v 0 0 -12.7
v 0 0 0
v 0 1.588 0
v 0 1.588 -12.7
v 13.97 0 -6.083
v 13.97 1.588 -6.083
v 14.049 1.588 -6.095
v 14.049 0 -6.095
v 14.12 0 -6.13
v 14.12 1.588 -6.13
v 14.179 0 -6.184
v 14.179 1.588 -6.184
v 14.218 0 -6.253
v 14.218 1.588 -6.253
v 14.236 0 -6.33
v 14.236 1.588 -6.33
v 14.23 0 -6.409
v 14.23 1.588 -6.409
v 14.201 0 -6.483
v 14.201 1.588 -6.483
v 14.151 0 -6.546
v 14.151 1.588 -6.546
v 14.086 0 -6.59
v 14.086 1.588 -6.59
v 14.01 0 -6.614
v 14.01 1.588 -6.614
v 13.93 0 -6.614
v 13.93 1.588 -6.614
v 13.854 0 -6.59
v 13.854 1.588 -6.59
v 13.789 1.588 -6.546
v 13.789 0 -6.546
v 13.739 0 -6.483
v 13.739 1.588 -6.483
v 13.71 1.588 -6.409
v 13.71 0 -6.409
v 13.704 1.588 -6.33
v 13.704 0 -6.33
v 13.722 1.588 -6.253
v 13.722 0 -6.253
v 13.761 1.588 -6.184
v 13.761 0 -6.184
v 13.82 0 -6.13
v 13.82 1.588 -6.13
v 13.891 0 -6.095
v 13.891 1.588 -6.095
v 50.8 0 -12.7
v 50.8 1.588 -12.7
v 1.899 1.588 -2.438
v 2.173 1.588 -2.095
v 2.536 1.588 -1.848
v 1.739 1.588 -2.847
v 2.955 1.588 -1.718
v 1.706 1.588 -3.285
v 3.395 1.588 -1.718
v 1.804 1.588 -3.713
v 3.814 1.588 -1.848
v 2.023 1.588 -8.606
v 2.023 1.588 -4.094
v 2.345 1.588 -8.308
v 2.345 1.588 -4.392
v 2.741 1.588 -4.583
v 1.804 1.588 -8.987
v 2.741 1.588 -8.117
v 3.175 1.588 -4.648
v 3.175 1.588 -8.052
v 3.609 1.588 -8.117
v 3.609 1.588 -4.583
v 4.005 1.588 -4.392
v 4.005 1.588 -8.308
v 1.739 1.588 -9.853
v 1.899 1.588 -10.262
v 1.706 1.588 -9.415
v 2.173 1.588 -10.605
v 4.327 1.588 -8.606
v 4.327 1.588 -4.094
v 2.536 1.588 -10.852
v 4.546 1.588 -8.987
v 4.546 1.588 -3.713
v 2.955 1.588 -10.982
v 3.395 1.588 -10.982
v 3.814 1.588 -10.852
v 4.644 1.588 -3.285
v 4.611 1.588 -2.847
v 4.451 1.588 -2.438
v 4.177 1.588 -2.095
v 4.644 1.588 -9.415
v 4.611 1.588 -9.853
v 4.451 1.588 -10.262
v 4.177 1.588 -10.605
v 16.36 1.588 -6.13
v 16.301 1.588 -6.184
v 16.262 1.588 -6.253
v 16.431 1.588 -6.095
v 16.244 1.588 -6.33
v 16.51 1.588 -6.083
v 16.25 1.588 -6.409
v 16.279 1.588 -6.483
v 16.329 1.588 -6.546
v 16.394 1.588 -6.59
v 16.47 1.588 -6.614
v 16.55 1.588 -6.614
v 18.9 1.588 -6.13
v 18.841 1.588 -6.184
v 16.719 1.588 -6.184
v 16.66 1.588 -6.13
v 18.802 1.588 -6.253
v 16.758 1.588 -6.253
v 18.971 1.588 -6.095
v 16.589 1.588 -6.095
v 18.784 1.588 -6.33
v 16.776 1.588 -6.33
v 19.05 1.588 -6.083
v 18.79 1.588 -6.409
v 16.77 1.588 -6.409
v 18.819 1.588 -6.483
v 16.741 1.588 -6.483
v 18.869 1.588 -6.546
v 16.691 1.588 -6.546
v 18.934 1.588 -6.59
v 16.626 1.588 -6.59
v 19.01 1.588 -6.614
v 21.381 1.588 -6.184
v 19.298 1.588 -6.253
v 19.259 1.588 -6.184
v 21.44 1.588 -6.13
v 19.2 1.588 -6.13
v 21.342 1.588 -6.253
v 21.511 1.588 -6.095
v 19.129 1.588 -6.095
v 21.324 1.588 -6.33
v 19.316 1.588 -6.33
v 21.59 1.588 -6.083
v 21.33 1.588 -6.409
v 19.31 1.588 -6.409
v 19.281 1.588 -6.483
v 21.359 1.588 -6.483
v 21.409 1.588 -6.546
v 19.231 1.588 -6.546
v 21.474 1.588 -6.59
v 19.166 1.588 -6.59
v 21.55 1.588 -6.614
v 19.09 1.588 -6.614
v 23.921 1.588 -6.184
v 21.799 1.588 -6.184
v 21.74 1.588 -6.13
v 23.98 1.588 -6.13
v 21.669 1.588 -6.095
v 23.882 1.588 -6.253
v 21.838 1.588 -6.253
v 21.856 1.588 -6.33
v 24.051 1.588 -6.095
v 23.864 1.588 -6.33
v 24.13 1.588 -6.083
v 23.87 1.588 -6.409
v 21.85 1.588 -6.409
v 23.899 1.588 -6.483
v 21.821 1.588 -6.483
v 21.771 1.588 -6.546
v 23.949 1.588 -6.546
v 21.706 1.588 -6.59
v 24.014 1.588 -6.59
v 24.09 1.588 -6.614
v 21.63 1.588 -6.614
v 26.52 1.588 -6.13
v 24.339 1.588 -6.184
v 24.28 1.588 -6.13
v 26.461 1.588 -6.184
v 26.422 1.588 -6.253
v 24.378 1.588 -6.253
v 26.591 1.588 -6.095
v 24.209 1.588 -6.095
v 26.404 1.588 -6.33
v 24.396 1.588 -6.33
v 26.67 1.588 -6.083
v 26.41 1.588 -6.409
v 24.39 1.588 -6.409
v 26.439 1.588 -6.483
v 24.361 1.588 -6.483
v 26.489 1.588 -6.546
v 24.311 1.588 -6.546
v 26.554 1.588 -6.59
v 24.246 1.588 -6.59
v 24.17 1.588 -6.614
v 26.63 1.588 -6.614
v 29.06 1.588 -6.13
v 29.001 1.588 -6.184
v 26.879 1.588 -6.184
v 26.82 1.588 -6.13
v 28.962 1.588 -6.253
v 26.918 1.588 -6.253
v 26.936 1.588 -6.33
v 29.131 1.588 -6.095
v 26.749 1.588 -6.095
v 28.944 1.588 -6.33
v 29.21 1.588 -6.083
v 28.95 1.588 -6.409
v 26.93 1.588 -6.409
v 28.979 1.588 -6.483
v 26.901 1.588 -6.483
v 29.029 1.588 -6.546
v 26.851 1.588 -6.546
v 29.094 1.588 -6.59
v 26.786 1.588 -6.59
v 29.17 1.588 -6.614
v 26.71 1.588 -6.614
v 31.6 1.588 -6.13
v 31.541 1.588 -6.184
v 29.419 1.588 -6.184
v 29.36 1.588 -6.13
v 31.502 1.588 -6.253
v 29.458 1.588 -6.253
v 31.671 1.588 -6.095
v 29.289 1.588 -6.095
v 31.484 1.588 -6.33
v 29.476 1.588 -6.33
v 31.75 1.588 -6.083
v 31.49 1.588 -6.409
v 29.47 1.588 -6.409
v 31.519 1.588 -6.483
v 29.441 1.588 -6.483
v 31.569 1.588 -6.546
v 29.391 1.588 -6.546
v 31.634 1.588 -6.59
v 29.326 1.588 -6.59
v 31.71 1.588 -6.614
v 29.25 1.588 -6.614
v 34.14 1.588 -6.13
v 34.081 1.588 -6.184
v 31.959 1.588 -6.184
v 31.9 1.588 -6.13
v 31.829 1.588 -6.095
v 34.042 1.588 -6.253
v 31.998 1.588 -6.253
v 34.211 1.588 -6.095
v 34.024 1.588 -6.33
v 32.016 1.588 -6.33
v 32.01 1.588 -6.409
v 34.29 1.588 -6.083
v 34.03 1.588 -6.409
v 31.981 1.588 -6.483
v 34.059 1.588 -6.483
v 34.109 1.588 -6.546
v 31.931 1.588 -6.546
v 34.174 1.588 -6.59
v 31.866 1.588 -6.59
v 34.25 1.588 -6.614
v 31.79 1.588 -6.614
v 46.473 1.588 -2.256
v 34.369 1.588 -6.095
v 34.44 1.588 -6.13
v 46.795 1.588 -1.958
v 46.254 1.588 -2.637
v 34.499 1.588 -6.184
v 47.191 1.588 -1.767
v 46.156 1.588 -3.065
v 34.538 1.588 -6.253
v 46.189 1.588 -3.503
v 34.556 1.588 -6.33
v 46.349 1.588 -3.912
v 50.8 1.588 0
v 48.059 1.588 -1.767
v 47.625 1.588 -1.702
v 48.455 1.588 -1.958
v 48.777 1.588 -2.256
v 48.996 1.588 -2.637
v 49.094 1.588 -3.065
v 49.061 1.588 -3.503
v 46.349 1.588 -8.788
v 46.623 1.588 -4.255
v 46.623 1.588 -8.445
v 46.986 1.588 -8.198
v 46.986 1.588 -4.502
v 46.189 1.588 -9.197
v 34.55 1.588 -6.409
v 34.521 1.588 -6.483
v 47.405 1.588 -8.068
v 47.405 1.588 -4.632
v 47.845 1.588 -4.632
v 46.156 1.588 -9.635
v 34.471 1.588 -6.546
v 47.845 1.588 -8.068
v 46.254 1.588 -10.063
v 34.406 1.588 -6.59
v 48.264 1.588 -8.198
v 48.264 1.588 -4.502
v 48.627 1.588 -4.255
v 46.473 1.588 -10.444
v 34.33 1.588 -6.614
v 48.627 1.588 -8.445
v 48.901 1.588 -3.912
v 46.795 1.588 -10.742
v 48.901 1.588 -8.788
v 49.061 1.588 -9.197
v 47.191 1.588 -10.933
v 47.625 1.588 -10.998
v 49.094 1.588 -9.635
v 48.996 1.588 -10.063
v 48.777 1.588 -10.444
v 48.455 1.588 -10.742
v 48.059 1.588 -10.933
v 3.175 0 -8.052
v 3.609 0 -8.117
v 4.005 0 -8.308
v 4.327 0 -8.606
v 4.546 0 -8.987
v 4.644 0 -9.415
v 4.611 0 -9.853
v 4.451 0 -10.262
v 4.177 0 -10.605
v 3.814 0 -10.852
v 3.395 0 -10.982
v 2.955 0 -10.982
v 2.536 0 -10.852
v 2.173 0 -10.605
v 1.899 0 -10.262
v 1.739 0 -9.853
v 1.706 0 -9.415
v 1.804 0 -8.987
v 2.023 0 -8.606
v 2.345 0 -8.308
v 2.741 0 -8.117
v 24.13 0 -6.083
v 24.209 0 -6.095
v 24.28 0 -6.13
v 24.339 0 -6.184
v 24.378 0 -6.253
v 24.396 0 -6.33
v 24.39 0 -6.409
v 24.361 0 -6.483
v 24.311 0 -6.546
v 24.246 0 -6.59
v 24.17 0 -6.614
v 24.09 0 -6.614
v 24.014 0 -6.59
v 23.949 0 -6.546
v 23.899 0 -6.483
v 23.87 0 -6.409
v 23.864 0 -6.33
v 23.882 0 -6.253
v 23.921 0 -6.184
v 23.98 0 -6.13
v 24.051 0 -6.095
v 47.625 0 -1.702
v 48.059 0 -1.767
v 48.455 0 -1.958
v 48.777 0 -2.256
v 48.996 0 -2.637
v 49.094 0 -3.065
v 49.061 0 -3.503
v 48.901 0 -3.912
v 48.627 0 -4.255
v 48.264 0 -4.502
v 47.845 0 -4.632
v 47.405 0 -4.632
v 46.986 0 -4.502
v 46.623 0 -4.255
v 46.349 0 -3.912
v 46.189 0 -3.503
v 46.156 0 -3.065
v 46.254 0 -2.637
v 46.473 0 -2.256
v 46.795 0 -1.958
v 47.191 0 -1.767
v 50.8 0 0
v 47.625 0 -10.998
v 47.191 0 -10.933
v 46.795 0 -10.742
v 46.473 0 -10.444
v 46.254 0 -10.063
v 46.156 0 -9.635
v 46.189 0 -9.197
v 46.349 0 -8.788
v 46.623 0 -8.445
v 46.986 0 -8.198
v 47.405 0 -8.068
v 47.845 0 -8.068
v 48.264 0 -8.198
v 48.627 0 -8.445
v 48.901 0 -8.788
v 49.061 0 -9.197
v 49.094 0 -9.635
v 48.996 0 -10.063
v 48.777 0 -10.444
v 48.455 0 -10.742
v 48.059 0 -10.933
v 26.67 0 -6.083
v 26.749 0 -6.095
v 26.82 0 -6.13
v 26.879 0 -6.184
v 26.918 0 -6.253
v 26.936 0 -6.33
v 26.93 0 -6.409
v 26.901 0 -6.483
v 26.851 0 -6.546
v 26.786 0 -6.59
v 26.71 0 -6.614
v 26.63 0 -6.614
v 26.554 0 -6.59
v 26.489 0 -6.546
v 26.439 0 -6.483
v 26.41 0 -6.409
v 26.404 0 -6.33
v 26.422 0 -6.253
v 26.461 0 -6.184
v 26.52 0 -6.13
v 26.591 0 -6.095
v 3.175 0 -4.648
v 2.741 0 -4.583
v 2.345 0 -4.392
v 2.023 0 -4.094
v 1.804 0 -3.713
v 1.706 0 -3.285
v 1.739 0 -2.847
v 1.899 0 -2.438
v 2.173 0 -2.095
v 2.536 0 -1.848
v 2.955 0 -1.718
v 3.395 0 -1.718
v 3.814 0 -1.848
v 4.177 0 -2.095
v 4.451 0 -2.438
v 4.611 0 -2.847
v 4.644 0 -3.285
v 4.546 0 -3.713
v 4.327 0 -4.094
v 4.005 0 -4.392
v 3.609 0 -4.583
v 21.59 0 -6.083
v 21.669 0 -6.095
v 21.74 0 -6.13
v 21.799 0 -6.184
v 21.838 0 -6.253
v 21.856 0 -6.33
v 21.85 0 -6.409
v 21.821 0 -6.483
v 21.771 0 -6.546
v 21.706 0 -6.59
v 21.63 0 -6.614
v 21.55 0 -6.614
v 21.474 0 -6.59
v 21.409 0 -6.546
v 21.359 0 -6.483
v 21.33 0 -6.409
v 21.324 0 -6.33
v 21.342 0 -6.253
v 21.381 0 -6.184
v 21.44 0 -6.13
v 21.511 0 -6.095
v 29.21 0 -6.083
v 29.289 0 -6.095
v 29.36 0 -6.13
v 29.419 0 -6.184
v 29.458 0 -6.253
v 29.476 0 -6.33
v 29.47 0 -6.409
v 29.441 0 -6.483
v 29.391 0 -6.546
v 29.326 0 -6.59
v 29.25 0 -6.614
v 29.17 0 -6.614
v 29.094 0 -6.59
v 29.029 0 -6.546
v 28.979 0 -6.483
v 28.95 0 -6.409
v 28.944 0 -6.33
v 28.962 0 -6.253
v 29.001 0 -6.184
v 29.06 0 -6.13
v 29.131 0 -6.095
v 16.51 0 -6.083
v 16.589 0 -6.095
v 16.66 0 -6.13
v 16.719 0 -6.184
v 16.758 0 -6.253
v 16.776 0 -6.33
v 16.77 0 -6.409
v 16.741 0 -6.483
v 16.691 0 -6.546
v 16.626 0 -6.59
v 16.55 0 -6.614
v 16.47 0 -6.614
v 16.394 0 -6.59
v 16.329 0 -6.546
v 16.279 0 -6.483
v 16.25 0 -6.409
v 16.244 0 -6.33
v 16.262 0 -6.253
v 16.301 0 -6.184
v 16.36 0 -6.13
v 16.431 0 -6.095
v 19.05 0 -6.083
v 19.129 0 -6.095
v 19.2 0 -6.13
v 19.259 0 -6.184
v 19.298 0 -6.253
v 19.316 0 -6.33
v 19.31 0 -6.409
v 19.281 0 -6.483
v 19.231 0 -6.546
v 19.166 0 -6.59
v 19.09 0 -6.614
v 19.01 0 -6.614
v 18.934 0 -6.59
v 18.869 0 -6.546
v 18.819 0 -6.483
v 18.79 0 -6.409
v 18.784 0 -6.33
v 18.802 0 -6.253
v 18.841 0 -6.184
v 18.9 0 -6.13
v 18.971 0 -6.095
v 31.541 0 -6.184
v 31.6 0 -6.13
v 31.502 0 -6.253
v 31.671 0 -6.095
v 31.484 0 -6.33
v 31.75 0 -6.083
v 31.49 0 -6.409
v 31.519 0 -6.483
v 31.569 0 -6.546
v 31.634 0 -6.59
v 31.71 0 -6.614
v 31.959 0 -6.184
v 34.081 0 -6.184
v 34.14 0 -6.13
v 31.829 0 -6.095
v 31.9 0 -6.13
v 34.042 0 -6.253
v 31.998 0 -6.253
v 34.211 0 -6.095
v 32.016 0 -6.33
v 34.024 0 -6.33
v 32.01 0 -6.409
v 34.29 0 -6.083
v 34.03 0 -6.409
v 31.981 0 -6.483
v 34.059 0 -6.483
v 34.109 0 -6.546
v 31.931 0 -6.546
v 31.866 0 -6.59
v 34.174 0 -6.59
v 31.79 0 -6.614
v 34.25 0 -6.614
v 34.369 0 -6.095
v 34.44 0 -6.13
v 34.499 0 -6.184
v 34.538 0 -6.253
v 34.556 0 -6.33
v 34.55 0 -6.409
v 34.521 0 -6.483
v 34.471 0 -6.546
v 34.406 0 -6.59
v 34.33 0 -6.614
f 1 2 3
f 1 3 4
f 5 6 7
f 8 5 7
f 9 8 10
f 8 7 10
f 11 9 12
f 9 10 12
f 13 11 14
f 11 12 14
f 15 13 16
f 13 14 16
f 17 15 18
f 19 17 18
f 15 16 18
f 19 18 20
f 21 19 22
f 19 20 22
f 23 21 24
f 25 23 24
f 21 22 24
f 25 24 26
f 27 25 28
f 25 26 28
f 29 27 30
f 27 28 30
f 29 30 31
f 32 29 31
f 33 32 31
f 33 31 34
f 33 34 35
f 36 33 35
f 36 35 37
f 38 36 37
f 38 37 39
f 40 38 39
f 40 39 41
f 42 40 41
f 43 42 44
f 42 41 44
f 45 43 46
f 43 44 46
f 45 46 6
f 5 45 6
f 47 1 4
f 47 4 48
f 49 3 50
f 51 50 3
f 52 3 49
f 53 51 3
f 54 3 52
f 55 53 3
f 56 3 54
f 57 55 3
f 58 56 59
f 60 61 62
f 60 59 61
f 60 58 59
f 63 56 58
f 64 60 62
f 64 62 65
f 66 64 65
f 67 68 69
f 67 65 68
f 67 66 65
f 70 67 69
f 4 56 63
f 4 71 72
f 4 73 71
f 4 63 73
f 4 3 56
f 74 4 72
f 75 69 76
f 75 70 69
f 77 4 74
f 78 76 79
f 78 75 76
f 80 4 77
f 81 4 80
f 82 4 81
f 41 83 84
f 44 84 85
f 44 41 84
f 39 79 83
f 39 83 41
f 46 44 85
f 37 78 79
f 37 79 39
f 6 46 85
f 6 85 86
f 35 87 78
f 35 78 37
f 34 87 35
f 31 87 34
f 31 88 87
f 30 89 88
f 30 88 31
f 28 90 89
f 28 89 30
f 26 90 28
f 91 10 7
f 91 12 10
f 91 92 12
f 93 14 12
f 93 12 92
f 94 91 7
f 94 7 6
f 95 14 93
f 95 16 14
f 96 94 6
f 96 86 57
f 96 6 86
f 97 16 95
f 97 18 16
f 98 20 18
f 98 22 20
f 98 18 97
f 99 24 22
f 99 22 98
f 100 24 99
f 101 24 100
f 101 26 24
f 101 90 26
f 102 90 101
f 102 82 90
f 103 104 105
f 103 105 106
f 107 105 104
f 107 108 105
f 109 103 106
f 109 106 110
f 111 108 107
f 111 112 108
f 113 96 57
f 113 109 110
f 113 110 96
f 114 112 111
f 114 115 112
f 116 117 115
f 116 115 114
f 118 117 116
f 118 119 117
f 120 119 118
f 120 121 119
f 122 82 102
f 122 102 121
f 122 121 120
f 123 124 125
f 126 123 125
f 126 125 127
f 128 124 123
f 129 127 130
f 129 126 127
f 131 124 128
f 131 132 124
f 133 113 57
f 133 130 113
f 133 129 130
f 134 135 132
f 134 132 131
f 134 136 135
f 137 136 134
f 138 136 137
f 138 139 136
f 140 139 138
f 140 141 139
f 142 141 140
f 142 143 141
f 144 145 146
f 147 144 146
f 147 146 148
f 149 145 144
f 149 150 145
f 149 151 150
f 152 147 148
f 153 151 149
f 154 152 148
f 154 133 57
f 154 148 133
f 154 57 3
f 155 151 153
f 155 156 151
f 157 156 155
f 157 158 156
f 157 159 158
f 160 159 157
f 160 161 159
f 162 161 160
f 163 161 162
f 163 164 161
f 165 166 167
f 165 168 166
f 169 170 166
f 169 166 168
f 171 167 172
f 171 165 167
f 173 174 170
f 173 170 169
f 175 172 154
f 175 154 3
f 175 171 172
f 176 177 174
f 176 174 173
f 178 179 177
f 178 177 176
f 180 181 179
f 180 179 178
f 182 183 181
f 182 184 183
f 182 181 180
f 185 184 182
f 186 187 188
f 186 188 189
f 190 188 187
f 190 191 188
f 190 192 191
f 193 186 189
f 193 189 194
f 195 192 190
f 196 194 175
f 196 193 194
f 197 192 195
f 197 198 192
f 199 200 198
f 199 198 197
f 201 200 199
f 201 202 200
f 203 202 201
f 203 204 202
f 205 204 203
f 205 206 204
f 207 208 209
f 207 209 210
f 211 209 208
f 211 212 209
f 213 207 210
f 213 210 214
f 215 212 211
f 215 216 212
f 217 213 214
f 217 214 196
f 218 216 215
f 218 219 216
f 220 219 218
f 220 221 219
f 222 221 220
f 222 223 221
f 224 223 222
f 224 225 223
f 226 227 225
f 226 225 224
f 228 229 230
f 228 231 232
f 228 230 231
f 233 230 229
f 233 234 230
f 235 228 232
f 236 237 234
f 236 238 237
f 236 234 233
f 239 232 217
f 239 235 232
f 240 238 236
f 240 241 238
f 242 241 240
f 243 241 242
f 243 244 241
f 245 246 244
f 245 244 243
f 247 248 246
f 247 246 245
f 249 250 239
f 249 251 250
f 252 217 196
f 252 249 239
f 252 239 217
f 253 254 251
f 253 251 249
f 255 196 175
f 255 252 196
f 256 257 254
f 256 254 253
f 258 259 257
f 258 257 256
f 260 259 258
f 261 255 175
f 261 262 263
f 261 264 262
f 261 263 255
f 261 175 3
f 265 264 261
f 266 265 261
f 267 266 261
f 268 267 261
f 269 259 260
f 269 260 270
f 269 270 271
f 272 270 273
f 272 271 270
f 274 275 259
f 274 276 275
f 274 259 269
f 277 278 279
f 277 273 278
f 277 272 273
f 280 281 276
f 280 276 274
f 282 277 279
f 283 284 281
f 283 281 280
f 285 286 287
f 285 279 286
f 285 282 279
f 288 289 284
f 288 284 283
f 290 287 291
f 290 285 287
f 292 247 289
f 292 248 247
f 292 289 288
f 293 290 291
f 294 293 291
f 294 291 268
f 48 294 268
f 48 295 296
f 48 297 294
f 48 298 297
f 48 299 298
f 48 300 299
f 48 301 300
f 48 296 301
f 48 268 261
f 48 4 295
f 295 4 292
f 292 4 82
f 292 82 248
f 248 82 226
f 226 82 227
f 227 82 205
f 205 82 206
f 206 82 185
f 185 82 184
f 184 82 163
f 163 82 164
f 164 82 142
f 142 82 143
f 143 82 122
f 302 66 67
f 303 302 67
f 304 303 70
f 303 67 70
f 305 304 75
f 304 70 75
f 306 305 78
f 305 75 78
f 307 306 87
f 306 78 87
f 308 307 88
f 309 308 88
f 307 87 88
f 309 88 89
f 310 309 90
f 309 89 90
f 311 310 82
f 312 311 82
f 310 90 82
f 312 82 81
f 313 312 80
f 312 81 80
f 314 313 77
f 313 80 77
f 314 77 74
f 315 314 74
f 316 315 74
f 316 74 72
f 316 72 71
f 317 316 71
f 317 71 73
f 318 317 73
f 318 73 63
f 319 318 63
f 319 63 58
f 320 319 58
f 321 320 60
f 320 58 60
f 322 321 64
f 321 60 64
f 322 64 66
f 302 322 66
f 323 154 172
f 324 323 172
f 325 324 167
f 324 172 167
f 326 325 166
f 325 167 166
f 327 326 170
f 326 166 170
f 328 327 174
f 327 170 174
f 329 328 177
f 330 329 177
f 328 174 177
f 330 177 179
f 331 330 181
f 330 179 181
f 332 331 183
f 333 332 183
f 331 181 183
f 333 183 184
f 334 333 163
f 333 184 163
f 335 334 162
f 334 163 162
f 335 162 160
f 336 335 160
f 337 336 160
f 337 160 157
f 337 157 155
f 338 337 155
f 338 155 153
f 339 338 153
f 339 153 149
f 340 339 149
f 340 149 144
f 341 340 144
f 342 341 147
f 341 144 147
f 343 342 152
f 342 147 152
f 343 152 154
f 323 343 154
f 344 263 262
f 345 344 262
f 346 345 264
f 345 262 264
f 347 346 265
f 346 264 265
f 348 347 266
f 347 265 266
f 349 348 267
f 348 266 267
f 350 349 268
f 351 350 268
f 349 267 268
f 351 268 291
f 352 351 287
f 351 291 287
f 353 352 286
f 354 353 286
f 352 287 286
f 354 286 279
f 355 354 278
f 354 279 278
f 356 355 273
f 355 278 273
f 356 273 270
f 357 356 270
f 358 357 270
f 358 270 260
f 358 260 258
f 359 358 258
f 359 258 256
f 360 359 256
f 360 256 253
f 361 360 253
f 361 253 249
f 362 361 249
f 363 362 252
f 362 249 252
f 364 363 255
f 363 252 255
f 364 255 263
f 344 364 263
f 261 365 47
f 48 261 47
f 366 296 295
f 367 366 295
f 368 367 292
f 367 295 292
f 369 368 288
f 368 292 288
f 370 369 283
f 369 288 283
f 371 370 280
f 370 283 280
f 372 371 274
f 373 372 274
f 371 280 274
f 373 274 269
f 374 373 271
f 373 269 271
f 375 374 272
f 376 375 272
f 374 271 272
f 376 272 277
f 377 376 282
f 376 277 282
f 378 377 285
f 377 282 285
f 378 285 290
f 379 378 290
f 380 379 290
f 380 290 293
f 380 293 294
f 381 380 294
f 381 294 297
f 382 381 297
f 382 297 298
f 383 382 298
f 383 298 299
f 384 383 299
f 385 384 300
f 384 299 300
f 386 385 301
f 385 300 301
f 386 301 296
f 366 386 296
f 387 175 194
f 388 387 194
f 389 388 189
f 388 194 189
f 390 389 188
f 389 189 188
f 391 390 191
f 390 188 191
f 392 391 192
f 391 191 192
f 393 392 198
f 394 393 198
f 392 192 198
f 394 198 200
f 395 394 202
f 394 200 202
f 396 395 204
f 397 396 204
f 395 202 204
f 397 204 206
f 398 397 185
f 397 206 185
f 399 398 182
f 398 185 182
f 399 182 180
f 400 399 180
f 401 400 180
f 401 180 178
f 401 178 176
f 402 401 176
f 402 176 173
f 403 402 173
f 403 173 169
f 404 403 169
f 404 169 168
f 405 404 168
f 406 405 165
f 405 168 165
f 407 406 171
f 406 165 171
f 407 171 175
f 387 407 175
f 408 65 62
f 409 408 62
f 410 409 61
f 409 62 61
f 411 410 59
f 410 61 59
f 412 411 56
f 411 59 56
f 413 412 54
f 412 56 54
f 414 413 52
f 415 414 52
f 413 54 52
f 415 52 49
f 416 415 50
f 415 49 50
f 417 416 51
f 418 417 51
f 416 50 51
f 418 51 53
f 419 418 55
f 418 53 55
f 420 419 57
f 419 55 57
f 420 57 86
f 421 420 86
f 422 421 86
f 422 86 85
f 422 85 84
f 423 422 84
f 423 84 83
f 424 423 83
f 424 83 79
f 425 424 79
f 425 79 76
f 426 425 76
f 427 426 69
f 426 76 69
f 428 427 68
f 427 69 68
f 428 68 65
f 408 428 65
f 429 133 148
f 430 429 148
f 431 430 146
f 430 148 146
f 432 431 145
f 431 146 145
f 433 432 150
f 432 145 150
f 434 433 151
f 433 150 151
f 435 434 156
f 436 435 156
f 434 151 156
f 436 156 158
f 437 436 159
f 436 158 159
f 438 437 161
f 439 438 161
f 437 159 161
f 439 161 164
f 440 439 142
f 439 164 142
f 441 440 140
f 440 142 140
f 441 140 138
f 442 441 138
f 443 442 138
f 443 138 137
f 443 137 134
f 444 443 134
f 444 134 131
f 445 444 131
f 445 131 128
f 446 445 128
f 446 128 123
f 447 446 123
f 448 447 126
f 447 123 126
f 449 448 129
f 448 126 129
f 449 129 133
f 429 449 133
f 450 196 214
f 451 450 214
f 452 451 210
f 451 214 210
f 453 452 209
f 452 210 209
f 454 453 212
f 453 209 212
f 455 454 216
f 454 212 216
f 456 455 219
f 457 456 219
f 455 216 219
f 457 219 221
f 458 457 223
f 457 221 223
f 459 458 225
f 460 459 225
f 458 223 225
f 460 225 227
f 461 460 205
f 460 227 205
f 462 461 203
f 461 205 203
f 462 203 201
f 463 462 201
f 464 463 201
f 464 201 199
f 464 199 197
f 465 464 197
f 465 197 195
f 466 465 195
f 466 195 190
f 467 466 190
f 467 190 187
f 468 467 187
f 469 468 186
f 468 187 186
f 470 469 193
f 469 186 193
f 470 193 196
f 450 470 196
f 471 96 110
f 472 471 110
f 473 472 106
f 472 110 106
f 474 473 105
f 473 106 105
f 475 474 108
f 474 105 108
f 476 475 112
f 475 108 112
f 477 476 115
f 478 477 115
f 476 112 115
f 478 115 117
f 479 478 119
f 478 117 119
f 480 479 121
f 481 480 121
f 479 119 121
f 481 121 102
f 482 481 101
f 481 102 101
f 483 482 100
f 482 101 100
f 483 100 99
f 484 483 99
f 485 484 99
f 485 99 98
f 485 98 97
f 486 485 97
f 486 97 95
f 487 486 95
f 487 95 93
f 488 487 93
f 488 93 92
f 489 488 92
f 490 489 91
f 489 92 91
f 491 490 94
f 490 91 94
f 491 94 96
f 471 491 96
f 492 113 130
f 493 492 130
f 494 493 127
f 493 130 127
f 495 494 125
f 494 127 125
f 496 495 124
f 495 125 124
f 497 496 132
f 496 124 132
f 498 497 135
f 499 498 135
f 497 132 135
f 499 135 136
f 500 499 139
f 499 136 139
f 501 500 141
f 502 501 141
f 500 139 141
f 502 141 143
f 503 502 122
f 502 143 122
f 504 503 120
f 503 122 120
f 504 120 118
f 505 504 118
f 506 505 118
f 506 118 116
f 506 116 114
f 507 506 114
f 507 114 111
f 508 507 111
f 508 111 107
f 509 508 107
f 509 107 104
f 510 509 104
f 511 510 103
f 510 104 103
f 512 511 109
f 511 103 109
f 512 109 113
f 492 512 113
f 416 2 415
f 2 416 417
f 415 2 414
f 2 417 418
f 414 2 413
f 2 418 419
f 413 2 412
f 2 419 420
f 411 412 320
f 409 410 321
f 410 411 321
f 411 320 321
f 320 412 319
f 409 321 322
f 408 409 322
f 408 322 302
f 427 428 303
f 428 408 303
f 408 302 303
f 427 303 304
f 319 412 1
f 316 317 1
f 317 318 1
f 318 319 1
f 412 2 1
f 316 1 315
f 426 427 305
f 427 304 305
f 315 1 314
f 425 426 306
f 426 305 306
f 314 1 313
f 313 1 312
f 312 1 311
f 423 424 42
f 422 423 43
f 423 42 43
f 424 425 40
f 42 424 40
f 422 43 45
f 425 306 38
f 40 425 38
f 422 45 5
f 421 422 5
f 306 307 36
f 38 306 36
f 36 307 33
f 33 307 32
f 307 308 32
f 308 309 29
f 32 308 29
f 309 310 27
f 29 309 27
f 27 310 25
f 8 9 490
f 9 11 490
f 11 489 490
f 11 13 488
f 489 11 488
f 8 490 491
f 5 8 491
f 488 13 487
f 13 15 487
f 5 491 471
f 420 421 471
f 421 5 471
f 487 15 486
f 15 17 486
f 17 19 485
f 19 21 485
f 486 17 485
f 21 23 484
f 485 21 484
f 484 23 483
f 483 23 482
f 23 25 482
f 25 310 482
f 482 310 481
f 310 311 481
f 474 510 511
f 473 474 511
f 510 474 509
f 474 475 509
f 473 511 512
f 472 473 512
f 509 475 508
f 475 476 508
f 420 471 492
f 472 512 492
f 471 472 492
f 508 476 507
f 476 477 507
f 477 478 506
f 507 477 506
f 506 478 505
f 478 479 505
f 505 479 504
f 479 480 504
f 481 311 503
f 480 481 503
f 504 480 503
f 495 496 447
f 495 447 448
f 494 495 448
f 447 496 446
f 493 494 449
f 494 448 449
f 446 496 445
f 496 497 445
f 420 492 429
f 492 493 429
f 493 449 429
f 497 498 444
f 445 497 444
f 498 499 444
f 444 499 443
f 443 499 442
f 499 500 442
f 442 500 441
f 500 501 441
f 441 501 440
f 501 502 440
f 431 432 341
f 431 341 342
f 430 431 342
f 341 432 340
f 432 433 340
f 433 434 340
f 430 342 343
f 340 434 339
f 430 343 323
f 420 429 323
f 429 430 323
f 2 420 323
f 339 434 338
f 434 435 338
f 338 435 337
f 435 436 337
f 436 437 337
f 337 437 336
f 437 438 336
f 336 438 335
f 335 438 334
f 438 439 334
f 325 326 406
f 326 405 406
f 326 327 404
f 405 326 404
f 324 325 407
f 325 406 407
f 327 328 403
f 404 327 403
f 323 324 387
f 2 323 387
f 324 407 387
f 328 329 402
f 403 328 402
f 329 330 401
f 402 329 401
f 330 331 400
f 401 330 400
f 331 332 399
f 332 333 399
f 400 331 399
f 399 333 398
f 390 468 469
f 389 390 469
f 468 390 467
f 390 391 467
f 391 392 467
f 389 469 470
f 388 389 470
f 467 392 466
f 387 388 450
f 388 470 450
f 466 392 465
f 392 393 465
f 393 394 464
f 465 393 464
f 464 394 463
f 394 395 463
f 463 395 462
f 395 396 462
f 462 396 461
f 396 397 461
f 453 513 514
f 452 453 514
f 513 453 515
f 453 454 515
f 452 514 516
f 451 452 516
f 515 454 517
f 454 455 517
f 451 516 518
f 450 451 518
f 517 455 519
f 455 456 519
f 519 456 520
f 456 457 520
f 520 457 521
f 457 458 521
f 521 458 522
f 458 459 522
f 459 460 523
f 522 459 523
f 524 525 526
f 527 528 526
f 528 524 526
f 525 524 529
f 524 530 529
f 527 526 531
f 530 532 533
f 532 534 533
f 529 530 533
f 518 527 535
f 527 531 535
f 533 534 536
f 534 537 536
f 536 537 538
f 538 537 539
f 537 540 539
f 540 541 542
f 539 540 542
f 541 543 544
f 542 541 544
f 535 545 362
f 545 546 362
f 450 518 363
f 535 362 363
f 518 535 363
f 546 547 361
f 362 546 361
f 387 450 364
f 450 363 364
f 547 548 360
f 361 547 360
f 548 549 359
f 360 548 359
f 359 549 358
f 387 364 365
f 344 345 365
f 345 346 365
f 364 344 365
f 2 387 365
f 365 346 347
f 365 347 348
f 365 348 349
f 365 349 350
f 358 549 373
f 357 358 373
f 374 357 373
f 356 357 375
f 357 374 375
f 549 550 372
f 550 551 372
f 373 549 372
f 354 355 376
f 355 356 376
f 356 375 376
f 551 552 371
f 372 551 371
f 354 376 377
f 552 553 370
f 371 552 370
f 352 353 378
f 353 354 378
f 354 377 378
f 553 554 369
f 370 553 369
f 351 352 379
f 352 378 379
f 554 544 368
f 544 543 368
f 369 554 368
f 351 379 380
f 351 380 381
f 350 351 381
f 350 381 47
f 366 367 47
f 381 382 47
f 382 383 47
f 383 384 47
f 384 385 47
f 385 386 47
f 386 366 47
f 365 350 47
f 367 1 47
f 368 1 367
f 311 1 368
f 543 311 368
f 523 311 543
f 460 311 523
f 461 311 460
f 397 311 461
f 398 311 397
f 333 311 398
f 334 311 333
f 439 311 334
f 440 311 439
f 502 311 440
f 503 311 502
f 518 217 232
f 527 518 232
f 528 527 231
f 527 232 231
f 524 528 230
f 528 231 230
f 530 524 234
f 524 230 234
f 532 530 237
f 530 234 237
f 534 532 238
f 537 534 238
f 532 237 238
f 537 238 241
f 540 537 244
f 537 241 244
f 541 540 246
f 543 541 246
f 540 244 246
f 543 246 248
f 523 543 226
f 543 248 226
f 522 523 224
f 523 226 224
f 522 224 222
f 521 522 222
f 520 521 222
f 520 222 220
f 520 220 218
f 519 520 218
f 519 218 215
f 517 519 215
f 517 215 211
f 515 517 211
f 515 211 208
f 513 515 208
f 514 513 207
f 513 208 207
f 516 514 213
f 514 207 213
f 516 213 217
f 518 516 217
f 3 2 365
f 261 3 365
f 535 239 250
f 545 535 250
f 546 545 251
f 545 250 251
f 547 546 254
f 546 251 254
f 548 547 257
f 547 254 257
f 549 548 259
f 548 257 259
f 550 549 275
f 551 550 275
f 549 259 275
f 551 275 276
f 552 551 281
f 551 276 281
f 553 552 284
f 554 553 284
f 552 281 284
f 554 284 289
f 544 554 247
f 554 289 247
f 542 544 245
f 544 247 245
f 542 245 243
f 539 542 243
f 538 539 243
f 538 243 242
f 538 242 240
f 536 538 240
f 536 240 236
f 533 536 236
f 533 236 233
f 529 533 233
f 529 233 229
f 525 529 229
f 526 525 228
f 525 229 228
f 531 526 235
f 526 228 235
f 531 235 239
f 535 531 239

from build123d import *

# Parameters (mm, degrees)
SKETCH1_W           = 50.8
SKETCH1_H           = 12.7
BOSS_EXTRUDE1_DEPTH = 1.5875
SKETCH2_R           = 1.4732
CUT_EXTRUDE1_DEPTH  = 1.5875
SKETCH3_R           = 0.2667
CUT_EXTRUDE2_DEPTH  = 1.5875


with BuildPart() as part:
    # Sketch1 → Boss-Extrude1 (new body)
    with BuildSketch(Plane(origin=(0, 0, 0), x_dir=(1, 0, 0), z_dir=(0, 1, 0))):
        with Locations((25.4, 6.35)):
            Rectangle(SKETCH1_W, SKETCH1_H)
    extrude(amount=BOSS_EXTRUDE1_DEPTH)

    # Sketch2 → Cut-Extrude1 (cut)
    with BuildSketch(Plane(origin=(0, 1.5875, 0), x_dir=(1, 0, 0), z_dir=(0, 1, 0))):
        with Locations(Location((3.175, 9.525, 0), (0, 0, 270))):
            Circle(SKETCH2_R)
        with Locations(Location((3.175, 3.175, 0), (0, 0, 90))):
            Circle(SKETCH2_R)
        with Locations(Location((47.625, 9.525, 0), (0, 0, 90))):
            Circle(SKETCH2_R)
        with Locations(Location((47.625, 3.175, 0), (0, 0, 270))):
            Circle(SKETCH2_R)
    extrude(amount=-CUT_EXTRUDE1_DEPTH, mode=Mode.SUBTRACT)

    # Sketch3 → Cut-Extrude2 (cut)
    with BuildSketch(Plane(origin=(0, 1.5875, 0), x_dir=(1, 0, 0), z_dir=(0, 1, 0))):
        with Locations(Location((24.13, 6.35, 0), (0, 0, 270))):
            Circle(SKETCH3_R)
        with Locations(Location((21.59, 6.35, 0), (0, 0, 270))):
            Circle(SKETCH3_R)
        with Locations(Location((19.05, 6.35, 0), (0, 0, 270))):
            Circle(SKETCH3_R)
        with Locations(Location((16.51, 6.35, 0), (0, 0, 270))):
            Circle(SKETCH3_R)
        with Locations(Location((13.97, 6.35, 0), (0, 0, 270))):
            Circle(SKETCH3_R)
        with Locations(Location((26.67, 6.35, 0), (0, 0, 270))):
            Circle(SKETCH3_R)
        with Locations(Location((29.21, 6.35, 0), (0, 0, 270))):
            Circle(SKETCH3_R)
        with Locations(Location((31.75, 6.35, 0), (0, 0, 270))):
            Circle(SKETCH3_R)
        with Locations(Location((34.29, 6.35, 0), (0, 0, 270))):
            Circle(SKETCH3_R)
    extrude(amount=-CUT_EXTRUDE2_DEPTH, mode=Mode.SUBTRACT)


solid = part.part
